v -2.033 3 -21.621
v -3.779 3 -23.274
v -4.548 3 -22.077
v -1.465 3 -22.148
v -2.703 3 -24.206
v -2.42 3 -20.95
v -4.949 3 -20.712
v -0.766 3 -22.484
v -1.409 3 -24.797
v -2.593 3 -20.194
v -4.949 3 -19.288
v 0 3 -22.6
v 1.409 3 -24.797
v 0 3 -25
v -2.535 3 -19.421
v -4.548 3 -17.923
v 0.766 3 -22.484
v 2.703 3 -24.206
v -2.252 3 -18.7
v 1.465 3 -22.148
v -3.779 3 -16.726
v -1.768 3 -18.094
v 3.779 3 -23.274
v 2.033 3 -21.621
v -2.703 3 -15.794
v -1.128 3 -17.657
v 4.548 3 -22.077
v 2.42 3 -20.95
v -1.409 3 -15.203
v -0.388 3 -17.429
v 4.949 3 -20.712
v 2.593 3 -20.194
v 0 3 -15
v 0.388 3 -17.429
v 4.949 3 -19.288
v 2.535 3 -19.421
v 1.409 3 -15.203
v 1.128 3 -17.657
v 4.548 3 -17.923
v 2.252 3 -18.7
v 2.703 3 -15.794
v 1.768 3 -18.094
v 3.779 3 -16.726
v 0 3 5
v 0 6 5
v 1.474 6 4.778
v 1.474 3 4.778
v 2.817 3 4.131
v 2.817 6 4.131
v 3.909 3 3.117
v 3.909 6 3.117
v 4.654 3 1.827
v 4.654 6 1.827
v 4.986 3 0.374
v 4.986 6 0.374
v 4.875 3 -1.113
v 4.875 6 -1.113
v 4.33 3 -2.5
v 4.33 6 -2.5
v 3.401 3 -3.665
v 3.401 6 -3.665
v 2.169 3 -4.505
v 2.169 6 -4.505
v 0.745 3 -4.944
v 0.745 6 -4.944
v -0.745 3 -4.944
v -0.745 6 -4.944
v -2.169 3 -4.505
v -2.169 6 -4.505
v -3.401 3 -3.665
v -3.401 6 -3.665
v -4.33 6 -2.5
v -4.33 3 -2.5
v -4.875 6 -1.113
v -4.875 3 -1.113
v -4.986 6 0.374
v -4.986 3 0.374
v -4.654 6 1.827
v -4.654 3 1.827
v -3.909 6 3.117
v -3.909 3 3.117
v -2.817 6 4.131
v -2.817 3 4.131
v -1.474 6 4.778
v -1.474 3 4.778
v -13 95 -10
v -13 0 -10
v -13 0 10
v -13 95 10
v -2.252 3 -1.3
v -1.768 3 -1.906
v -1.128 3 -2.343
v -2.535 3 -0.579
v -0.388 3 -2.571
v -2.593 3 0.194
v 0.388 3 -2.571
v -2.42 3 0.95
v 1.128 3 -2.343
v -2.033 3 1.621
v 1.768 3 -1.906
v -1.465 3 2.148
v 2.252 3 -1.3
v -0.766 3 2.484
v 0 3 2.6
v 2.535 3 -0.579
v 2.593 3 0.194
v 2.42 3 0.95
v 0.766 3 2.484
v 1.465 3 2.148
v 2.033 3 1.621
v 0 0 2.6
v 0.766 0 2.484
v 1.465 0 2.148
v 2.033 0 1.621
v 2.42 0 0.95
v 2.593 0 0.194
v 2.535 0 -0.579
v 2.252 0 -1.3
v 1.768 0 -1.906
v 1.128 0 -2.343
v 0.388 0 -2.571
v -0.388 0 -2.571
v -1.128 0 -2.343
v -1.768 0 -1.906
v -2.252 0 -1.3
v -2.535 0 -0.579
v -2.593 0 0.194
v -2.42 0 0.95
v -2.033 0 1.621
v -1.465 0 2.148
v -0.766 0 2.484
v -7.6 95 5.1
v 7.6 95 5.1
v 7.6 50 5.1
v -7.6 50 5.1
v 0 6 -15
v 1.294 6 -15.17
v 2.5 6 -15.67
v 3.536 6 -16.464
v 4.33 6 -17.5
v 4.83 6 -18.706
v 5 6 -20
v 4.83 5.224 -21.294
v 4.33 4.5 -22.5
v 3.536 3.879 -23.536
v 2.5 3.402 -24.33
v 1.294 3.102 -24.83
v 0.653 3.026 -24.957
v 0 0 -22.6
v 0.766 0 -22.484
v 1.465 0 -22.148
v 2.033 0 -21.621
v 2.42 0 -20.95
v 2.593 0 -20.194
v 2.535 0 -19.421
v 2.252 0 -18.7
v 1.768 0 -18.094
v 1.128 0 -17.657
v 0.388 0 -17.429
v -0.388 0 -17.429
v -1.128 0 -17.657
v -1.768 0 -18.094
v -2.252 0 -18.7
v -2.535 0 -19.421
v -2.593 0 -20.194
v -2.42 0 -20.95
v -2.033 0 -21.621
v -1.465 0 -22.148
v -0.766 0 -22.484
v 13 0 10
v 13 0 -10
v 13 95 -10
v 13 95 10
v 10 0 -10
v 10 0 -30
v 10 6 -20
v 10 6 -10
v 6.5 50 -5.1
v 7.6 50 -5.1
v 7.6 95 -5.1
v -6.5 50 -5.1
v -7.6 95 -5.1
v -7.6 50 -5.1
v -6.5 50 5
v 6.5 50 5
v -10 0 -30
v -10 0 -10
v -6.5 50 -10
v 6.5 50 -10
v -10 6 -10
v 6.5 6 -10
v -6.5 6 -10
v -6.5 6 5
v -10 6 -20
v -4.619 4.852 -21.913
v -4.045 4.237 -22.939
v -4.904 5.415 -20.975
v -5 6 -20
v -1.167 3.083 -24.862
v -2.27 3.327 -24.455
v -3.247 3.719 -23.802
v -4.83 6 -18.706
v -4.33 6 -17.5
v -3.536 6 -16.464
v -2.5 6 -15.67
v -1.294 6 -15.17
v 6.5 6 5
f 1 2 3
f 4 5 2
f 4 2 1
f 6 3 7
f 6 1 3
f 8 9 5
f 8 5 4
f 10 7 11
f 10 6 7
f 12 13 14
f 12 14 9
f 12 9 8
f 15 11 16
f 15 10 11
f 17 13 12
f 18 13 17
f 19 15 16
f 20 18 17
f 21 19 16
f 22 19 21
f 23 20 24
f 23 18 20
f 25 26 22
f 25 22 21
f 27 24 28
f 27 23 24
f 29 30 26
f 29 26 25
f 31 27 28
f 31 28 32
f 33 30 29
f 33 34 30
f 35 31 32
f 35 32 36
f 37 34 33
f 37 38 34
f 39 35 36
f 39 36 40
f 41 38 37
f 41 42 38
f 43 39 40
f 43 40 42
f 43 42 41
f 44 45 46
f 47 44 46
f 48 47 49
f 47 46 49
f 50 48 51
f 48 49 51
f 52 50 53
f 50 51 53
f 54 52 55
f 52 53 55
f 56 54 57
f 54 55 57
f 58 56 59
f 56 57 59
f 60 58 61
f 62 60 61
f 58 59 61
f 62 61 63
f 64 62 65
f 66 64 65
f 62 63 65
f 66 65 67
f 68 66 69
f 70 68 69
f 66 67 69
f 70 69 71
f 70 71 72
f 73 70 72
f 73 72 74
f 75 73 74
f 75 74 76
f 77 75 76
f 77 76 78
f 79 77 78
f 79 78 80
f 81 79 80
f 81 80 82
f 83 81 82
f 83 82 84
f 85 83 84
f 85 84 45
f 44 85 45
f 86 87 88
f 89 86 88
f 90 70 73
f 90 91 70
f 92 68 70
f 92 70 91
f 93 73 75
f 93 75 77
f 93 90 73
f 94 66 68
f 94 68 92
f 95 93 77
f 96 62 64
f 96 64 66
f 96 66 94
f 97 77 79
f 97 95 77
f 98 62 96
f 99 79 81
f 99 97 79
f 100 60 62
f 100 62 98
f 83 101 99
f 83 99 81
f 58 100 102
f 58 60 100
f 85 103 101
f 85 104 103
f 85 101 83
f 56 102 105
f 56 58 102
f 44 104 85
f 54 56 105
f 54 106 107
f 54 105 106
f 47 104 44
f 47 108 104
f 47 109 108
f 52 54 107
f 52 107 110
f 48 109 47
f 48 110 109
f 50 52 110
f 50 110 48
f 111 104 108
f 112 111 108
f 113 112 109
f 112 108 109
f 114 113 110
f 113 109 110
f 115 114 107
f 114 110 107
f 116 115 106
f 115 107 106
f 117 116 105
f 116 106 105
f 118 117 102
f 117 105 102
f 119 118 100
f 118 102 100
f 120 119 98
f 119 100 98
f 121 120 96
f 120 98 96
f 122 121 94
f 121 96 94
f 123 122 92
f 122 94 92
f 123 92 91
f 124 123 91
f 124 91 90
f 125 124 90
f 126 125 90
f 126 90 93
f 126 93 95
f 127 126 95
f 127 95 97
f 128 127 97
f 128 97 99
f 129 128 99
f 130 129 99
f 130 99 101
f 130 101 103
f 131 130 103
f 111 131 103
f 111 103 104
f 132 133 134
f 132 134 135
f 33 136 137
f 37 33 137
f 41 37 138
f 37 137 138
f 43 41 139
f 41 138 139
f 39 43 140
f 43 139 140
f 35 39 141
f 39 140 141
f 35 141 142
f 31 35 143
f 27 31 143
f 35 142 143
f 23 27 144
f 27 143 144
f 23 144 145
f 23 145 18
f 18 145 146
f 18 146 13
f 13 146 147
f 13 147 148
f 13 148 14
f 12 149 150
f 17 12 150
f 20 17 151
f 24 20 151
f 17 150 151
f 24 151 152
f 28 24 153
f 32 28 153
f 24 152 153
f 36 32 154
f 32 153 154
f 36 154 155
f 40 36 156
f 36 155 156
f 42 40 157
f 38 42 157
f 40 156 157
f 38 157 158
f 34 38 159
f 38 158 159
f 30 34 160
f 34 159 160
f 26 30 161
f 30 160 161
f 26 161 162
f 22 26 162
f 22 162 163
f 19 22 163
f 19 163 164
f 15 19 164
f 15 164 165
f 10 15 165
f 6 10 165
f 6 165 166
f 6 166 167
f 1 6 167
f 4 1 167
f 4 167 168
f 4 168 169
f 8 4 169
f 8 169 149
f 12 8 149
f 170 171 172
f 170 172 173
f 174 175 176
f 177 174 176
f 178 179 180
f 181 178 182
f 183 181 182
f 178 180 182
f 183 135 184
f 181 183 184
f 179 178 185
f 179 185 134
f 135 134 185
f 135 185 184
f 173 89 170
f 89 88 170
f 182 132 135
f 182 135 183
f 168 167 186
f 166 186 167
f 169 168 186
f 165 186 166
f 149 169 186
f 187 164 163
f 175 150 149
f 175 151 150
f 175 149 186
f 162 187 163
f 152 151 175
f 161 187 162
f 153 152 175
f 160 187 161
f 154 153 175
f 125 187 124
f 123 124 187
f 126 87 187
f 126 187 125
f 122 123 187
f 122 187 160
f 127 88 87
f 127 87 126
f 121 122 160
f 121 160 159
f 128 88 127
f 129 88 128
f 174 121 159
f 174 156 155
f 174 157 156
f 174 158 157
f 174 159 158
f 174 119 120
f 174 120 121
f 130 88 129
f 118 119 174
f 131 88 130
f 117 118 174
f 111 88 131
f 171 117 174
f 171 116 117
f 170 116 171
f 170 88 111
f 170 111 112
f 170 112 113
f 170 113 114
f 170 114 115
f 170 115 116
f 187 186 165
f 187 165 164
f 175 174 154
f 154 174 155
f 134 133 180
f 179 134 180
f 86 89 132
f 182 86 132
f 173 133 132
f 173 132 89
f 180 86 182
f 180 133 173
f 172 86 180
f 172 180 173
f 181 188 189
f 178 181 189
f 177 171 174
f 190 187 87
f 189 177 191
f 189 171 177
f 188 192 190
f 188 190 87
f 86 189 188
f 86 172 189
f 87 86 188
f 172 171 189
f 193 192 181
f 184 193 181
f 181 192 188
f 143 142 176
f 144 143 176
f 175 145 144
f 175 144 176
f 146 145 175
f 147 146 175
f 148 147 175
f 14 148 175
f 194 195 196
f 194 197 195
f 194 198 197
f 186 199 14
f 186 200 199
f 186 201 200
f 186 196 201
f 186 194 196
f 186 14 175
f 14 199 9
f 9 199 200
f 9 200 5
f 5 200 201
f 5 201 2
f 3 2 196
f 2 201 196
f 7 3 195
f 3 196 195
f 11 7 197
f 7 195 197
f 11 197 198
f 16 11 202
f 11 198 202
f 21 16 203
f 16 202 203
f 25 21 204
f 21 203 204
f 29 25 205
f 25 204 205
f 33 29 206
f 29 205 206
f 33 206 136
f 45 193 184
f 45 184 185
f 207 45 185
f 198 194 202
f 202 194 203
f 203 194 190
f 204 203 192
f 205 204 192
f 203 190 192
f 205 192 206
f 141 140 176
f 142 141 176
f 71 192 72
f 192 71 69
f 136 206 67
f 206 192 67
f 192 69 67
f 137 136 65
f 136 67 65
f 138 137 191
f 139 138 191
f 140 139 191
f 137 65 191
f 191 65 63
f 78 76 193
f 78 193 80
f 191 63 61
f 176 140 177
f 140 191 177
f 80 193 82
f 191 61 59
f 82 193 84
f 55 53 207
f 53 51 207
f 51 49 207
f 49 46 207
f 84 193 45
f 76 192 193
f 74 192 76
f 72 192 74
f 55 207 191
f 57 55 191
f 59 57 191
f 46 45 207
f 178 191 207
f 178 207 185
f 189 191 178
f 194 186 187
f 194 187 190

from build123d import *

# Parameters (mm, degrees)
EXTRUDE_1_DEPTH      = 6
SKETCH_2_R           = 2.6
CUT_EXTRUDE_1_DEPTH  = 6
SKETCH_3_R           = 5
CUT_EXTRUDE_2_DEPTH  = 3
SKETCH_4_W           = 26
SKETCH_4_H           = 20
SKETCH_4_W_2         = 15
SKETCH_4_H_2         = 10
EXTRUDE_2_DEPTH      = 89
CUT_EXTRUDE_5_DEPTH  = 5
SKETCH_6_W           = 1
SKETCH_6_H           = 44
EXTRUDE_3_DEPTH      = 15
SKETCH_8_W           = 26
SKETCH_8_H           = 20
SKETCH_8_R           = 2.6
EXTRUDE_4_DEPTH      = 6
SKETCH_9_R           = 5
CUT_EXTRUDE_6_DEPTH  = 3
CUT_EXTRUDE_7_DEPTH  = 30
SKETCH_11_W          = 3
SKETCH_11_H          = 6
CUT_EXTRUDE_8_DEPTH  = 30
CUT_EXTRUDE_10_DEPTH = 45


with BuildPart() as part:
    # 草图1 → 凸台-拉伸1 (new body)
    with BuildSketch(Plane(origin=(0, 0, 0), x_dir=(1, 0, 0), z_dir=(0, 1, 0))):
        Polygon((-10, -10), (10, -10), (13, -10), (13, 10), (10, 10), (-10, 10), (-13, 10), (-13, -10), align=None)
    extrude(amount=EXTRUDE_1_DEPTH)

    # 草图2 → 切除-拉伸1 (cut)
    with BuildSketch(Plane(origin=(0, 6, 0), x_dir=(1, 0, 0), z_dir=(0, 1, 0))):
        with Locations(Location((0, 0, 0), (0, 0, 270))):
            Circle(SKETCH_2_R)
    extrude(amount=-CUT_EXTRUDE_1_DEPTH, mode=Mode.SUBTRACT)

    # 草图3 → 切除-拉伸2 (cut)
    with BuildSketch(Plane(origin=(0, 6, 0), x_dir=(1, 0, 0), z_dir=(0, 1, 0))):
        with Locations(Location((0, 0, 0), (0, 0, 270))):
            Circle(SKETCH_3_R)
    extrude(amount=-CUT_EXTRUDE_2_DEPTH, mode=Mode.SUBTRACT)

    # 草图4 → 凸台-拉伸2 (add)
    with BuildSketch(Plane(origin=(0, 6, 0), x_dir=(1, 0, 0), z_dir=(0, 1, 0))):
        Rectangle(SKETCH_4_W, SKETCH_4_H)
        Rectangle(SKETCH_4_W_2, SKETCH_4_H_2, mode=Mode.SUBTRACT)
    extrude(amount=EXTRUDE_2_DEPTH)

    # 草图5 → 切除-拉伸5 (cut)
    with BuildSketch(Plane(origin=(0, 0, -10), x_dir=(-1, 0, 0), z_dir=(0, 0, -1))):
        Polygon((0, 6), (7.5, 6), (7.5, 15), (7.5, 30), (7.5, 50), (-7.5, 50), (-7.5, 30), (-7.5, 15), (-7.5, 6), align=None)
    extrude(amount=-CUT_EXTRUDE_5_DEPTH, mode=Mode.SUBTRACT)

    # 草图6 → 凸台-拉伸3 (add)
    with BuildSketch(Plane(origin=(0, 0, -10), x_dir=(-1, 0, 0), z_dir=(0, 0, -1))):
        with Locations((7, 28)):
            Rectangle(SKETCH_6_W, SKETCH_6_H)
        with Locations((-7, 28)):
            Rectangle(SKETCH_6_W, SKETCH_6_H)
    extrude(amount=-EXTRUDE_3_DEPTH)

    # 草图8 → 凸台-拉伸4 (add)
    with BuildSketch(Plane.XZ):
        with Locations((0, -20)):
            Rectangle(SKETCH_8_W, SKETCH_8_H)
        with Locations(Location((0, -20, 0), (0, 0, 270))):
            Circle(SKETCH_8_R, mode=Mode.SUBTRACT)
    extrude(amount=-EXTRUDE_4_DEPTH)

    # 草图9 → 切除-拉伸6 (cut)
    with BuildSketch(Plane(origin=(0, 6, 0), x_dir=(1, 0, 0), z_dir=(0, 1, 0))):
        with Locations(Location((0, 20, 0), (0, 0, 270))):
            Circle(SKETCH_9_R)
    extrude(amount=-CUT_EXTRUDE_6_DEPTH, mode=Mode.SUBTRACT)

    # 草图10 → 切除-拉伸7 (cut)
    with BuildSketch(Plane.ZY.offset(13)):
        Polygon((-20, 6), (-30, 0), (-30, 6), align=None)
    extrude(amount=-CUT_EXTRUDE_7_DEPTH, mode=Mode.SUBTRACT)

    # 草图11 → 切除-拉伸8 (cut)
    with BuildSketch(Plane(origin=(0, 0, -10), x_dir=(-1, 0, 0), z_dir=(0, 0, -1))):
        with Locations((-11.5, 3)):
            Rectangle(SKETCH_11_W, SKETCH_11_H)
        with Locations((11.5, 3)):
            Rectangle(SKETCH_11_W, SKETCH_11_H)
    extrude(amount=CUT_EXTRUDE_8_DEPTH, mode=Mode.SUBTRACT)

    # 草图12 → 切除-拉伸10 (cut)
    with BuildSketch(Plane(origin=(0, 95, 0), x_dir=(1, 0, 0), z_dir=(0, 1, 0))):
        Polygon((-7.5, 5.1), (-7.5, 5), (7.5, 5), (7.5, -5), (7.6, -5), (7.6, 5.1), align=None)
        Polygon((-7.6, -5.1), (-7.6, 5.1), (-7.5, 5.1), (-7.5, 5), (-7.5, -5), (7.5, -5), (7.6, -5), (7.6, -5.1), align=None)
    extrude(amount=-CUT_EXTRUDE_10_DEPTH, mode=Mode.SUBTRACT)


solid = part.part
